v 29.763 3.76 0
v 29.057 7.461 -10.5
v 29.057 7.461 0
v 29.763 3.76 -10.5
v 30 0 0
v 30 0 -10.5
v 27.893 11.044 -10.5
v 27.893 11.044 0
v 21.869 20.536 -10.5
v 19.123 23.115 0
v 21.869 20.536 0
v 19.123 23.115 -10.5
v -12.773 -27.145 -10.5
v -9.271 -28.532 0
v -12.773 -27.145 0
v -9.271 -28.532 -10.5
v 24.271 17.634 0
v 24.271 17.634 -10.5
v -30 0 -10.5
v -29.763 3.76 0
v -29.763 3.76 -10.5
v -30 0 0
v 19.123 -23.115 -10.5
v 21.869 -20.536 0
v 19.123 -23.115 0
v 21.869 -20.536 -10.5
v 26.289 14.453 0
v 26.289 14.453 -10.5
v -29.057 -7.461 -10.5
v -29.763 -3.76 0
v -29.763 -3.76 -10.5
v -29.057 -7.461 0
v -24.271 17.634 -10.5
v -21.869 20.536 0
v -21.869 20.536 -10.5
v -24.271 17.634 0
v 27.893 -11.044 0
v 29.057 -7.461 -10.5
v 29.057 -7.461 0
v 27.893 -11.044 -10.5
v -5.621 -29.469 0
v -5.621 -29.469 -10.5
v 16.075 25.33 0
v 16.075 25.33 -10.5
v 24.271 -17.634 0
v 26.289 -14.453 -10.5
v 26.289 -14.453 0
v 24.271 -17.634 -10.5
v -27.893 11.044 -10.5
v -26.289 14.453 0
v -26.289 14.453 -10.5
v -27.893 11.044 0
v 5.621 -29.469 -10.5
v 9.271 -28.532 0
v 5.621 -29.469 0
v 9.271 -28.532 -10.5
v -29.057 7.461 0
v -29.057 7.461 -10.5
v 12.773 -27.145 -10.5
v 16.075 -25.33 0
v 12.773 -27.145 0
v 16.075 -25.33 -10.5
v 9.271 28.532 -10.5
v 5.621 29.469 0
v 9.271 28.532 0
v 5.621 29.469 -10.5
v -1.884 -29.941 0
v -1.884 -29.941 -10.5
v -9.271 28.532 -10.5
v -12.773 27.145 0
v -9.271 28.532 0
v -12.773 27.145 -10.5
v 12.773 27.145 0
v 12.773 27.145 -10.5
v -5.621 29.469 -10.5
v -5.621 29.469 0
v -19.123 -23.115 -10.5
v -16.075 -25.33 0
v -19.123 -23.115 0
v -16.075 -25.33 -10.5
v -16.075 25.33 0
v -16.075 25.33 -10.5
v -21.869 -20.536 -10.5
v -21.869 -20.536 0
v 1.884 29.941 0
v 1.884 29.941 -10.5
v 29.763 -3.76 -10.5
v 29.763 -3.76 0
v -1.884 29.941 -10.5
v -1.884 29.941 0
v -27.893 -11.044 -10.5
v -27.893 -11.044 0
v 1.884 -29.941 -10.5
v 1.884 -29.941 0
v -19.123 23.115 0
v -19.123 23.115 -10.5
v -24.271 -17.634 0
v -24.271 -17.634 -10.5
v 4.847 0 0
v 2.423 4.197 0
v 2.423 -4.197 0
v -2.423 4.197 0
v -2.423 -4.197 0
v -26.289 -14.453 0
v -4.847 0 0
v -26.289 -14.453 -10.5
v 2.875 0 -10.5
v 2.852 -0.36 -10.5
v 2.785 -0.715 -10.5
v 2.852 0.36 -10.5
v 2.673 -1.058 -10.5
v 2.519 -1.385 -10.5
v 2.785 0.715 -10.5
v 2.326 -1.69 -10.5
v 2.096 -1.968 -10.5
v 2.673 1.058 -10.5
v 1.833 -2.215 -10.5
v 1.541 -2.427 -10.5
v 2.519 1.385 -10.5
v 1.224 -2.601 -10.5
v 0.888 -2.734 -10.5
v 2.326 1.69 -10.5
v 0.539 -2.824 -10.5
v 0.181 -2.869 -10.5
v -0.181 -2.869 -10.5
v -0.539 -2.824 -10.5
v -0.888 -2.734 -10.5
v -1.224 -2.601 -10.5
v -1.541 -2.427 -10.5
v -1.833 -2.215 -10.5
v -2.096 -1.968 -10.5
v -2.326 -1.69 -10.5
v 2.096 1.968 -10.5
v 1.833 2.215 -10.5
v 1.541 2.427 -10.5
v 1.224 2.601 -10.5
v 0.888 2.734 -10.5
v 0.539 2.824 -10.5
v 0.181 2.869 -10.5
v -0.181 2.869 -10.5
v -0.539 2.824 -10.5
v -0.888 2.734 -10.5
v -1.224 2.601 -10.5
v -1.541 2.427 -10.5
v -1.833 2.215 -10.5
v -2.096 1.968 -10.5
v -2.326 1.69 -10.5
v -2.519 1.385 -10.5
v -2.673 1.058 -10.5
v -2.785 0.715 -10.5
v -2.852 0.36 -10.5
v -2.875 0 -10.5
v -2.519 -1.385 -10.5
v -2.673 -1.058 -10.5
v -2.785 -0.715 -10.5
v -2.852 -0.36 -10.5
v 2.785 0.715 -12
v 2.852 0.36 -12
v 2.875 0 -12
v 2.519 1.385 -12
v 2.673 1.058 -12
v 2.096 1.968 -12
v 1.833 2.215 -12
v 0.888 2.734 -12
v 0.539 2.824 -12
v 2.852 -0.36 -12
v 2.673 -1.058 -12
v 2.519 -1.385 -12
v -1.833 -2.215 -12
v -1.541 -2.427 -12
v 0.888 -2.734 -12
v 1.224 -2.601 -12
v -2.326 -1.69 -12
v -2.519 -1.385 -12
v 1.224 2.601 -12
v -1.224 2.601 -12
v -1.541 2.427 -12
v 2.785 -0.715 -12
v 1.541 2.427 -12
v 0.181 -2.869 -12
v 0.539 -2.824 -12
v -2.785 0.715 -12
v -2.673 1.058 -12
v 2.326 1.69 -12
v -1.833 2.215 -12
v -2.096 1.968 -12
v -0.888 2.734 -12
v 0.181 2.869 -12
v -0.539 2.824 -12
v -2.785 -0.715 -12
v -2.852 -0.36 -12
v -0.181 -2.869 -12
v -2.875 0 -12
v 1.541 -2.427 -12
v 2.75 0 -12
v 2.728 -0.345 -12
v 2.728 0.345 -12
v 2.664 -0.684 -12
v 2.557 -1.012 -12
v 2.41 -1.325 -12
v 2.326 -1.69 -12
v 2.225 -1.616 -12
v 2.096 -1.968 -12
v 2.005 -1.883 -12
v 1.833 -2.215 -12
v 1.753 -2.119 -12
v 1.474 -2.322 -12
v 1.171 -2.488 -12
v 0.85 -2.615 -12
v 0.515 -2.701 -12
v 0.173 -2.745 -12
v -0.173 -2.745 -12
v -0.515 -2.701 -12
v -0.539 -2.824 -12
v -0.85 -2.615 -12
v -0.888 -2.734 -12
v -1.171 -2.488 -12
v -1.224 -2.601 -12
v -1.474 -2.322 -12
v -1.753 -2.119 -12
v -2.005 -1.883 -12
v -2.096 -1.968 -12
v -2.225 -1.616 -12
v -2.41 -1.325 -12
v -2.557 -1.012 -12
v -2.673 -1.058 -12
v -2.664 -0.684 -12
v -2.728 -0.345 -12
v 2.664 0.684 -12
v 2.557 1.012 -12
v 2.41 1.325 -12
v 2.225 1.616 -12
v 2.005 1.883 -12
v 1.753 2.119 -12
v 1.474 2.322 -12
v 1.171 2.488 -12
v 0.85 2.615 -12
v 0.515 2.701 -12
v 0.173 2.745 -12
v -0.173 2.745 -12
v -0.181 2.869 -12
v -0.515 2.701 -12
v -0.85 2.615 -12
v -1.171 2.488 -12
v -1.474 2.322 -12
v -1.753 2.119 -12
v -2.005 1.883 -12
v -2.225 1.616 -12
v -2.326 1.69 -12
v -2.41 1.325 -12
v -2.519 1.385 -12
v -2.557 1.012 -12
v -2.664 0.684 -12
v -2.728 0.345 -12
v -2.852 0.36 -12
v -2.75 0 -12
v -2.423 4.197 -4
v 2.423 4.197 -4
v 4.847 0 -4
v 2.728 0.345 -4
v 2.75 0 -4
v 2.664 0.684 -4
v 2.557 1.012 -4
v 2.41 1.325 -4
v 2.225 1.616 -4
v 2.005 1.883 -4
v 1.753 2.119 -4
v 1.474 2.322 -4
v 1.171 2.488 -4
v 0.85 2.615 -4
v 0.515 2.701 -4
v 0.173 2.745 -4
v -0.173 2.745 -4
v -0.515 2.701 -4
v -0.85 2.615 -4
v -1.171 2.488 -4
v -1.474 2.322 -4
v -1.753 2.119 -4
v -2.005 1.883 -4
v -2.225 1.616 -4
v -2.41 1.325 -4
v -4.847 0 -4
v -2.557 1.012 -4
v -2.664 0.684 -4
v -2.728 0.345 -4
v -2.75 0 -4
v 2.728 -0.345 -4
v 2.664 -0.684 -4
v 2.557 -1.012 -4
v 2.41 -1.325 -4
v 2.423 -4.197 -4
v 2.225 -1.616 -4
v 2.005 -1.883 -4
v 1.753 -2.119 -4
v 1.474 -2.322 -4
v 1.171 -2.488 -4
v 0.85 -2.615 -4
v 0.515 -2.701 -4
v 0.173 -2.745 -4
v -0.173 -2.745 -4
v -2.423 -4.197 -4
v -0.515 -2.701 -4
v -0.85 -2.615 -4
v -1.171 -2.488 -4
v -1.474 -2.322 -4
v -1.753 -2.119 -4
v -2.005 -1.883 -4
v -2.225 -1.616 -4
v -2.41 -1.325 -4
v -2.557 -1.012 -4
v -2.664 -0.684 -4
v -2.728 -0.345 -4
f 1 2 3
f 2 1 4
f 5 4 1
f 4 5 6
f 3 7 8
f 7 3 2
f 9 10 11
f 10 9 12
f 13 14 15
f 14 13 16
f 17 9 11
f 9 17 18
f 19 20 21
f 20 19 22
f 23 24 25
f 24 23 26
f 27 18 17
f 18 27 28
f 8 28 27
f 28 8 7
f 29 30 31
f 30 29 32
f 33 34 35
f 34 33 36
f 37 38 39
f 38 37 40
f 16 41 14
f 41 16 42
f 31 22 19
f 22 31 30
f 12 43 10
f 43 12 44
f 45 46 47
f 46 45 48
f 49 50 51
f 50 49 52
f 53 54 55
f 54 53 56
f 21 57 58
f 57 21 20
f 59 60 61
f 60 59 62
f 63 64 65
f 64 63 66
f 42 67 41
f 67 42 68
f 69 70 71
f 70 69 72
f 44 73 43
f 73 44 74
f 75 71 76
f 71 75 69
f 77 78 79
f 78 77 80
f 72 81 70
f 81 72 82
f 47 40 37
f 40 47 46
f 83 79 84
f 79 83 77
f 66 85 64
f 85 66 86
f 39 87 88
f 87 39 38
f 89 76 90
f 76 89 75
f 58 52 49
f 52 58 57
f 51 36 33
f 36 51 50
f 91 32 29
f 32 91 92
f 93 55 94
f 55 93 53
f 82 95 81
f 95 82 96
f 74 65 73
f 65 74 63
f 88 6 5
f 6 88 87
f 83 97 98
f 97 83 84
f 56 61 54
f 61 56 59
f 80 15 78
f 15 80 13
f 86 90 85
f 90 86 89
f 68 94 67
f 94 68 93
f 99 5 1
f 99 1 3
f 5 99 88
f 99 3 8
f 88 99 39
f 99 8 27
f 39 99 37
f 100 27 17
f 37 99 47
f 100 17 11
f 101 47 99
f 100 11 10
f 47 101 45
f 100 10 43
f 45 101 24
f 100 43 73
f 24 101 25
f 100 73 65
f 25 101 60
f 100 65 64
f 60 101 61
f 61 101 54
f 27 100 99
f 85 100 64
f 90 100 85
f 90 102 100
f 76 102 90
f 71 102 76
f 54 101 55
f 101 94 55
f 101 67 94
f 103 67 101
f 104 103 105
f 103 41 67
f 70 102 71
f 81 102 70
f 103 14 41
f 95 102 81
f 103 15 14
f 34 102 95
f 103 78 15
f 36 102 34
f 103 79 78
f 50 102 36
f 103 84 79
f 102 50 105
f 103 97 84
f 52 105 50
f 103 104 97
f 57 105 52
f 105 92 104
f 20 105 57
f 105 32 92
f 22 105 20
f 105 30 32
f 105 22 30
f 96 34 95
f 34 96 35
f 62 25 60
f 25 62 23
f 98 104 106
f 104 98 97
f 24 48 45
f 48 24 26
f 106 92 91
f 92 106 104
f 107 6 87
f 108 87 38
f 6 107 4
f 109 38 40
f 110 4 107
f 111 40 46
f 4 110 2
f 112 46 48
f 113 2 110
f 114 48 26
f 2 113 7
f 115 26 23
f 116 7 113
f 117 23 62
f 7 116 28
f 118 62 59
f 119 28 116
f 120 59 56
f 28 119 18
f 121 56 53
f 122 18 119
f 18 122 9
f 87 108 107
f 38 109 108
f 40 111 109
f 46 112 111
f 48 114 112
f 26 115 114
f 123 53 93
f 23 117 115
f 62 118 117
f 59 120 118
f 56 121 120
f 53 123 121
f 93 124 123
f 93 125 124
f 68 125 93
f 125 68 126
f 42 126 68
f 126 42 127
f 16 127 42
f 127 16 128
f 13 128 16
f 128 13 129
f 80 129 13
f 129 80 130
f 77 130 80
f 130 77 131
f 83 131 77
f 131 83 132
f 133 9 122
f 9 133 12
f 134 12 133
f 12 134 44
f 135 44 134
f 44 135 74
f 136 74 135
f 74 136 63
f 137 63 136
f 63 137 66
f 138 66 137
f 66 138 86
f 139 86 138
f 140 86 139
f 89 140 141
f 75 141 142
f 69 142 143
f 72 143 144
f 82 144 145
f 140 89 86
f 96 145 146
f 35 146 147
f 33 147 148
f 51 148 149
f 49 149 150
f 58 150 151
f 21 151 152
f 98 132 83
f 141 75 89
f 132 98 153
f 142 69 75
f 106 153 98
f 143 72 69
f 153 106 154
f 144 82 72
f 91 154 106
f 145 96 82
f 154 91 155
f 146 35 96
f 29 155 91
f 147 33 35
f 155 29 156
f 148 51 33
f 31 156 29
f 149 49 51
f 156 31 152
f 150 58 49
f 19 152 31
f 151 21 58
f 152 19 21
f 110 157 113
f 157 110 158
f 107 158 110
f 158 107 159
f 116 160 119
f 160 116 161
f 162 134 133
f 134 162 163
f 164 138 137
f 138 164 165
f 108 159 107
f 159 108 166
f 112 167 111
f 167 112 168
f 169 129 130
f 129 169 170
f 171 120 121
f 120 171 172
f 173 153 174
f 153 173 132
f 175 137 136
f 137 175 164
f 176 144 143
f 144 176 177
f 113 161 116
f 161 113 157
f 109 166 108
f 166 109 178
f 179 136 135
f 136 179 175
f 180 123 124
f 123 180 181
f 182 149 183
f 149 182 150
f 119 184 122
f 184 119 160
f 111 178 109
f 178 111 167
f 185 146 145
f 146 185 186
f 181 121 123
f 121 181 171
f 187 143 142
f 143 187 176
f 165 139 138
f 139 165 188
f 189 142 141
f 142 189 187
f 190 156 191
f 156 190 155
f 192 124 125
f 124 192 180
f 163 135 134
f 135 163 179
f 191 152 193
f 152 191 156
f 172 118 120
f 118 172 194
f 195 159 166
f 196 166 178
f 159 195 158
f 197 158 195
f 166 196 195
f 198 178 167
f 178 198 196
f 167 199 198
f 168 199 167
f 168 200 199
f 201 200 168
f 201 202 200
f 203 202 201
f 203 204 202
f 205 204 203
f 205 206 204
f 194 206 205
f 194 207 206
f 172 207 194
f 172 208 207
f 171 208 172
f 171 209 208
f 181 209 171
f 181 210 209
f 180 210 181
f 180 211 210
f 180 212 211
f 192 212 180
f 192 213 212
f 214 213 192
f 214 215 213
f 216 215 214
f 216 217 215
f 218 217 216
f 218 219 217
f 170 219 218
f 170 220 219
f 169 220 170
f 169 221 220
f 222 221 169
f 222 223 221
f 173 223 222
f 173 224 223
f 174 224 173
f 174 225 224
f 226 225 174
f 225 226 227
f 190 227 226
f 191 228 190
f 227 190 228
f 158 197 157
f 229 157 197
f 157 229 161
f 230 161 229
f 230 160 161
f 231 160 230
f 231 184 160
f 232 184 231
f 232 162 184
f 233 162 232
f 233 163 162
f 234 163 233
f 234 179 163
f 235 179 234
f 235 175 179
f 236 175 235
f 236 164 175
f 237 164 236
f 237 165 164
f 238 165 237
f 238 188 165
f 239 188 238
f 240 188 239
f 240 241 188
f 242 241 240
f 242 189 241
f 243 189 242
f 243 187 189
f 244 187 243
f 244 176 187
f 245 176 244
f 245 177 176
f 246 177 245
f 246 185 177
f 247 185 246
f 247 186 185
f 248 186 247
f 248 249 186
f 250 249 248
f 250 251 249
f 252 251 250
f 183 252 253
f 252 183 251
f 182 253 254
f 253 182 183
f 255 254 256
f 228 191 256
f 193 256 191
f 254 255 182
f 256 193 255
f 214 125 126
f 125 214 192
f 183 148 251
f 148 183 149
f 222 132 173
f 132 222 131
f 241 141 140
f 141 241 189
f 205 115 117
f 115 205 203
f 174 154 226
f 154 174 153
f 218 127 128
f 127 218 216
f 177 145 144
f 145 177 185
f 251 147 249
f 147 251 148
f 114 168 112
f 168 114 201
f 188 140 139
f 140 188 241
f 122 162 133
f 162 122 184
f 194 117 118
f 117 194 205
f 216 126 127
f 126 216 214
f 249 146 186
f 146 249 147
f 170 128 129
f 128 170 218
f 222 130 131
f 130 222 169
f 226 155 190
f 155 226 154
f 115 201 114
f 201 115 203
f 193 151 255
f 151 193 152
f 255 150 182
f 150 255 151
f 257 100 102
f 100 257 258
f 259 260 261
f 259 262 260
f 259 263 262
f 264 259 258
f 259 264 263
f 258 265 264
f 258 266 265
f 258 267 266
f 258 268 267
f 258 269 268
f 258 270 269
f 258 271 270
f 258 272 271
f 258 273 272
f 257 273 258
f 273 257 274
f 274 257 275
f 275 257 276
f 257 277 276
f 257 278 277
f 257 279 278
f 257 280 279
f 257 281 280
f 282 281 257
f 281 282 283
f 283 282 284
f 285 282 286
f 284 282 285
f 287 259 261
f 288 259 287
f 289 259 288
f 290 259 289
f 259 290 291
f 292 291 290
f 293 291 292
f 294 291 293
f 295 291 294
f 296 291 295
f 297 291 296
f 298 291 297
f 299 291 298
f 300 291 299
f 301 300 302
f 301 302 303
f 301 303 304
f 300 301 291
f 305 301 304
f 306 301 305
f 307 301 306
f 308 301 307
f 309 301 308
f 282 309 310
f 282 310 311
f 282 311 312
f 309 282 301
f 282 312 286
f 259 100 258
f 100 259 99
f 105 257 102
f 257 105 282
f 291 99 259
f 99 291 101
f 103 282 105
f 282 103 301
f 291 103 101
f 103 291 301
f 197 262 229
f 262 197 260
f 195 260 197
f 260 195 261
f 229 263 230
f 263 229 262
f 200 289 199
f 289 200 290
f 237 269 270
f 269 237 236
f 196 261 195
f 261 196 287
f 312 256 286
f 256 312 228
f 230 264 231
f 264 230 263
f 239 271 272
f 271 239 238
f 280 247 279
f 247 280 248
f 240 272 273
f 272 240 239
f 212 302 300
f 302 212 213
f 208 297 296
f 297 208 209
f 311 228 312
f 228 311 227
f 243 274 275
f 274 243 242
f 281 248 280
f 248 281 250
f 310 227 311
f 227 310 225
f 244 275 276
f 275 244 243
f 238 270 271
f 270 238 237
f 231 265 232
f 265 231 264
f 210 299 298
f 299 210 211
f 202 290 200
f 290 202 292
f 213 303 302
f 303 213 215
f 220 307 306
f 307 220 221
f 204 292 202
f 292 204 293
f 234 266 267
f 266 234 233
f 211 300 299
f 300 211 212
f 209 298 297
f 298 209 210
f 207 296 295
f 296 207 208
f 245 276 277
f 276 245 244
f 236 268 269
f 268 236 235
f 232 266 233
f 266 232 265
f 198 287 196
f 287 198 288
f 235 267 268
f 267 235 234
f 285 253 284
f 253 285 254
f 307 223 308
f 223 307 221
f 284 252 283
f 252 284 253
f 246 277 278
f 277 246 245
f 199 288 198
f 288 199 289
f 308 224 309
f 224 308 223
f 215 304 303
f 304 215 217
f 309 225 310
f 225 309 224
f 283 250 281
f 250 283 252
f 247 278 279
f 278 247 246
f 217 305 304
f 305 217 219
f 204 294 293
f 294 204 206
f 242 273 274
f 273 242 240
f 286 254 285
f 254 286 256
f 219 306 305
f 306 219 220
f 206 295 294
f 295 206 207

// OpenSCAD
$fn = 50;

difference() {
	union() {
		translate(v = [0, 0, -10.5]) {
			cylinder(h = 10.5, r = 30.0);
		}
		#translate(v = [0, 0, -12.0]) {
			cylinder(h = 12, r = 2.875);
		}
	}
	union() {
		translate(v = [0, 0, 0]) {
			rotate(a = [0, 0, 0]) {
				difference() {
					union() {
						translate(v = [0, 0, -4]) {
							linear_extrude(height = 4) {
								polygon(points = [[4.8468, 0.0], [2.4234000000000004, 4.197451927062417], [-2.423399999999999, 4.197451927062417], [-4.8468, 5.935618106107392e-16], [-2.423400000000002, -4.197451927062416], [2.423399999999997, -4.197451927062419]]);
							}
						}
					}
					union();
				}
			}
		}
		#translate(v = [0, 0, -100.0]) {
			cylinder(h = 200, r = 2.75);
		}
	}
}
